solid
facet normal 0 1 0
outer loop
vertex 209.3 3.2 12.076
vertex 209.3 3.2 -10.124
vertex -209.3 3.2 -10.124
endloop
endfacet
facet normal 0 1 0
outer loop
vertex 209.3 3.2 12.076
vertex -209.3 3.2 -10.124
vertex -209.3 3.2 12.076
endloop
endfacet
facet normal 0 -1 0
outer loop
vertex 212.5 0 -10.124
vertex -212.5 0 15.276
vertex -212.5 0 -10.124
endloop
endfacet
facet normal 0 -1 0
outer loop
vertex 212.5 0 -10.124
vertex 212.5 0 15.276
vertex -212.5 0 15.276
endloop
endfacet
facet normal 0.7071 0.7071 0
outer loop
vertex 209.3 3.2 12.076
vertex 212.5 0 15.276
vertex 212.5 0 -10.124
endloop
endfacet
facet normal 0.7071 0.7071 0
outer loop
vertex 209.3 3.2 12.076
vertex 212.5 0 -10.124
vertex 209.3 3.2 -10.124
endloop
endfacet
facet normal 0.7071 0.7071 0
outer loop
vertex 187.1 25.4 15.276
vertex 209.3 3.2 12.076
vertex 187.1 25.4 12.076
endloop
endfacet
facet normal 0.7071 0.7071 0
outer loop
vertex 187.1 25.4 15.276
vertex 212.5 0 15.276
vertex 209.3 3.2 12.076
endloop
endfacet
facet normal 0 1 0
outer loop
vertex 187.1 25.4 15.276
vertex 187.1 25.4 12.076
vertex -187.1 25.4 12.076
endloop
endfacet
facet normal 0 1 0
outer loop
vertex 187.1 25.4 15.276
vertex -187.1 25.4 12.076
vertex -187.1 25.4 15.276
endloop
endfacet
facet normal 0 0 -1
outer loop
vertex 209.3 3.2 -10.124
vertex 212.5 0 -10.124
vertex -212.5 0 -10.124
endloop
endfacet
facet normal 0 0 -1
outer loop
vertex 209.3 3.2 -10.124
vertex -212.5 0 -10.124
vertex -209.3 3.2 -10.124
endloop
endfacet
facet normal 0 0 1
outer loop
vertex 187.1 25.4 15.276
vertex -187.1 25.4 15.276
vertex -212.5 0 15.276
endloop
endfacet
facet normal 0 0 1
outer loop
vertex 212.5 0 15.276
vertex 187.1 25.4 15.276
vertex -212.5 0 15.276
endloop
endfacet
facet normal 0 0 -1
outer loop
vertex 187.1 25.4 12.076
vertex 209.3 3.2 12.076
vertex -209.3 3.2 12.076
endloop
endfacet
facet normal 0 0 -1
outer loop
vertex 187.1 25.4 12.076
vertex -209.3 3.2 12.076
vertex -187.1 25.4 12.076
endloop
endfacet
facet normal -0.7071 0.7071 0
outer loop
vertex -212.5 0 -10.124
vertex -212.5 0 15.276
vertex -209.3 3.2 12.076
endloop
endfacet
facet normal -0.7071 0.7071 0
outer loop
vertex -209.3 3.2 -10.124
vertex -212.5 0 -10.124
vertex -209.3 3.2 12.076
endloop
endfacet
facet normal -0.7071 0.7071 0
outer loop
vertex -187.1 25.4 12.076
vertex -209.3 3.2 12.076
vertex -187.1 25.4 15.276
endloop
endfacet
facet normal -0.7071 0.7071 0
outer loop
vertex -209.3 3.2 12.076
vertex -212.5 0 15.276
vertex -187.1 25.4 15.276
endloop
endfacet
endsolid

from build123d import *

# Parameters (mm, degrees)
F1_DEPTH = 212.5
F3_DEPTH = 25.4


# Not quite as in the source:
# - a pattern or mirror of a feature is missing from the dataset's text; its kind, count and spacing are read off the source's solid


with BuildPart() as f1:
    # F0 (on Right) → F1 (new body, symmetric)
    with BuildSketch(Plane.YZ):
        Polygon((0, 15.2755248485), (0, -10.1244751515), (3.2, -10.1244751515), (3.2, 12.0755248485), (25.4, 12.0755248485), (25.4, 15.2755248485), align=None)
    extrude(amount=F1_DEPTH, both=True)

    # F2 (on face) → F3 (cut)
    with BuildSketch(Plane.XY.offset(15.2755248485)):
        Polygon((-212.5, 25.4), (-212.5, 0), (-187.1, 25.4), align=None)
    f3 = extrude(amount=-F3_DEPTH, mode=Mode.SUBTRACT)

    # F3_copies: F3 across plane
    add(f3.mirror(Plane(origin=(0, 0, 0), x_dir=(0, 0, 1), z_dir=(1, 0, 0))), mode=Mode.SUBTRACT)


solid = f1.part
